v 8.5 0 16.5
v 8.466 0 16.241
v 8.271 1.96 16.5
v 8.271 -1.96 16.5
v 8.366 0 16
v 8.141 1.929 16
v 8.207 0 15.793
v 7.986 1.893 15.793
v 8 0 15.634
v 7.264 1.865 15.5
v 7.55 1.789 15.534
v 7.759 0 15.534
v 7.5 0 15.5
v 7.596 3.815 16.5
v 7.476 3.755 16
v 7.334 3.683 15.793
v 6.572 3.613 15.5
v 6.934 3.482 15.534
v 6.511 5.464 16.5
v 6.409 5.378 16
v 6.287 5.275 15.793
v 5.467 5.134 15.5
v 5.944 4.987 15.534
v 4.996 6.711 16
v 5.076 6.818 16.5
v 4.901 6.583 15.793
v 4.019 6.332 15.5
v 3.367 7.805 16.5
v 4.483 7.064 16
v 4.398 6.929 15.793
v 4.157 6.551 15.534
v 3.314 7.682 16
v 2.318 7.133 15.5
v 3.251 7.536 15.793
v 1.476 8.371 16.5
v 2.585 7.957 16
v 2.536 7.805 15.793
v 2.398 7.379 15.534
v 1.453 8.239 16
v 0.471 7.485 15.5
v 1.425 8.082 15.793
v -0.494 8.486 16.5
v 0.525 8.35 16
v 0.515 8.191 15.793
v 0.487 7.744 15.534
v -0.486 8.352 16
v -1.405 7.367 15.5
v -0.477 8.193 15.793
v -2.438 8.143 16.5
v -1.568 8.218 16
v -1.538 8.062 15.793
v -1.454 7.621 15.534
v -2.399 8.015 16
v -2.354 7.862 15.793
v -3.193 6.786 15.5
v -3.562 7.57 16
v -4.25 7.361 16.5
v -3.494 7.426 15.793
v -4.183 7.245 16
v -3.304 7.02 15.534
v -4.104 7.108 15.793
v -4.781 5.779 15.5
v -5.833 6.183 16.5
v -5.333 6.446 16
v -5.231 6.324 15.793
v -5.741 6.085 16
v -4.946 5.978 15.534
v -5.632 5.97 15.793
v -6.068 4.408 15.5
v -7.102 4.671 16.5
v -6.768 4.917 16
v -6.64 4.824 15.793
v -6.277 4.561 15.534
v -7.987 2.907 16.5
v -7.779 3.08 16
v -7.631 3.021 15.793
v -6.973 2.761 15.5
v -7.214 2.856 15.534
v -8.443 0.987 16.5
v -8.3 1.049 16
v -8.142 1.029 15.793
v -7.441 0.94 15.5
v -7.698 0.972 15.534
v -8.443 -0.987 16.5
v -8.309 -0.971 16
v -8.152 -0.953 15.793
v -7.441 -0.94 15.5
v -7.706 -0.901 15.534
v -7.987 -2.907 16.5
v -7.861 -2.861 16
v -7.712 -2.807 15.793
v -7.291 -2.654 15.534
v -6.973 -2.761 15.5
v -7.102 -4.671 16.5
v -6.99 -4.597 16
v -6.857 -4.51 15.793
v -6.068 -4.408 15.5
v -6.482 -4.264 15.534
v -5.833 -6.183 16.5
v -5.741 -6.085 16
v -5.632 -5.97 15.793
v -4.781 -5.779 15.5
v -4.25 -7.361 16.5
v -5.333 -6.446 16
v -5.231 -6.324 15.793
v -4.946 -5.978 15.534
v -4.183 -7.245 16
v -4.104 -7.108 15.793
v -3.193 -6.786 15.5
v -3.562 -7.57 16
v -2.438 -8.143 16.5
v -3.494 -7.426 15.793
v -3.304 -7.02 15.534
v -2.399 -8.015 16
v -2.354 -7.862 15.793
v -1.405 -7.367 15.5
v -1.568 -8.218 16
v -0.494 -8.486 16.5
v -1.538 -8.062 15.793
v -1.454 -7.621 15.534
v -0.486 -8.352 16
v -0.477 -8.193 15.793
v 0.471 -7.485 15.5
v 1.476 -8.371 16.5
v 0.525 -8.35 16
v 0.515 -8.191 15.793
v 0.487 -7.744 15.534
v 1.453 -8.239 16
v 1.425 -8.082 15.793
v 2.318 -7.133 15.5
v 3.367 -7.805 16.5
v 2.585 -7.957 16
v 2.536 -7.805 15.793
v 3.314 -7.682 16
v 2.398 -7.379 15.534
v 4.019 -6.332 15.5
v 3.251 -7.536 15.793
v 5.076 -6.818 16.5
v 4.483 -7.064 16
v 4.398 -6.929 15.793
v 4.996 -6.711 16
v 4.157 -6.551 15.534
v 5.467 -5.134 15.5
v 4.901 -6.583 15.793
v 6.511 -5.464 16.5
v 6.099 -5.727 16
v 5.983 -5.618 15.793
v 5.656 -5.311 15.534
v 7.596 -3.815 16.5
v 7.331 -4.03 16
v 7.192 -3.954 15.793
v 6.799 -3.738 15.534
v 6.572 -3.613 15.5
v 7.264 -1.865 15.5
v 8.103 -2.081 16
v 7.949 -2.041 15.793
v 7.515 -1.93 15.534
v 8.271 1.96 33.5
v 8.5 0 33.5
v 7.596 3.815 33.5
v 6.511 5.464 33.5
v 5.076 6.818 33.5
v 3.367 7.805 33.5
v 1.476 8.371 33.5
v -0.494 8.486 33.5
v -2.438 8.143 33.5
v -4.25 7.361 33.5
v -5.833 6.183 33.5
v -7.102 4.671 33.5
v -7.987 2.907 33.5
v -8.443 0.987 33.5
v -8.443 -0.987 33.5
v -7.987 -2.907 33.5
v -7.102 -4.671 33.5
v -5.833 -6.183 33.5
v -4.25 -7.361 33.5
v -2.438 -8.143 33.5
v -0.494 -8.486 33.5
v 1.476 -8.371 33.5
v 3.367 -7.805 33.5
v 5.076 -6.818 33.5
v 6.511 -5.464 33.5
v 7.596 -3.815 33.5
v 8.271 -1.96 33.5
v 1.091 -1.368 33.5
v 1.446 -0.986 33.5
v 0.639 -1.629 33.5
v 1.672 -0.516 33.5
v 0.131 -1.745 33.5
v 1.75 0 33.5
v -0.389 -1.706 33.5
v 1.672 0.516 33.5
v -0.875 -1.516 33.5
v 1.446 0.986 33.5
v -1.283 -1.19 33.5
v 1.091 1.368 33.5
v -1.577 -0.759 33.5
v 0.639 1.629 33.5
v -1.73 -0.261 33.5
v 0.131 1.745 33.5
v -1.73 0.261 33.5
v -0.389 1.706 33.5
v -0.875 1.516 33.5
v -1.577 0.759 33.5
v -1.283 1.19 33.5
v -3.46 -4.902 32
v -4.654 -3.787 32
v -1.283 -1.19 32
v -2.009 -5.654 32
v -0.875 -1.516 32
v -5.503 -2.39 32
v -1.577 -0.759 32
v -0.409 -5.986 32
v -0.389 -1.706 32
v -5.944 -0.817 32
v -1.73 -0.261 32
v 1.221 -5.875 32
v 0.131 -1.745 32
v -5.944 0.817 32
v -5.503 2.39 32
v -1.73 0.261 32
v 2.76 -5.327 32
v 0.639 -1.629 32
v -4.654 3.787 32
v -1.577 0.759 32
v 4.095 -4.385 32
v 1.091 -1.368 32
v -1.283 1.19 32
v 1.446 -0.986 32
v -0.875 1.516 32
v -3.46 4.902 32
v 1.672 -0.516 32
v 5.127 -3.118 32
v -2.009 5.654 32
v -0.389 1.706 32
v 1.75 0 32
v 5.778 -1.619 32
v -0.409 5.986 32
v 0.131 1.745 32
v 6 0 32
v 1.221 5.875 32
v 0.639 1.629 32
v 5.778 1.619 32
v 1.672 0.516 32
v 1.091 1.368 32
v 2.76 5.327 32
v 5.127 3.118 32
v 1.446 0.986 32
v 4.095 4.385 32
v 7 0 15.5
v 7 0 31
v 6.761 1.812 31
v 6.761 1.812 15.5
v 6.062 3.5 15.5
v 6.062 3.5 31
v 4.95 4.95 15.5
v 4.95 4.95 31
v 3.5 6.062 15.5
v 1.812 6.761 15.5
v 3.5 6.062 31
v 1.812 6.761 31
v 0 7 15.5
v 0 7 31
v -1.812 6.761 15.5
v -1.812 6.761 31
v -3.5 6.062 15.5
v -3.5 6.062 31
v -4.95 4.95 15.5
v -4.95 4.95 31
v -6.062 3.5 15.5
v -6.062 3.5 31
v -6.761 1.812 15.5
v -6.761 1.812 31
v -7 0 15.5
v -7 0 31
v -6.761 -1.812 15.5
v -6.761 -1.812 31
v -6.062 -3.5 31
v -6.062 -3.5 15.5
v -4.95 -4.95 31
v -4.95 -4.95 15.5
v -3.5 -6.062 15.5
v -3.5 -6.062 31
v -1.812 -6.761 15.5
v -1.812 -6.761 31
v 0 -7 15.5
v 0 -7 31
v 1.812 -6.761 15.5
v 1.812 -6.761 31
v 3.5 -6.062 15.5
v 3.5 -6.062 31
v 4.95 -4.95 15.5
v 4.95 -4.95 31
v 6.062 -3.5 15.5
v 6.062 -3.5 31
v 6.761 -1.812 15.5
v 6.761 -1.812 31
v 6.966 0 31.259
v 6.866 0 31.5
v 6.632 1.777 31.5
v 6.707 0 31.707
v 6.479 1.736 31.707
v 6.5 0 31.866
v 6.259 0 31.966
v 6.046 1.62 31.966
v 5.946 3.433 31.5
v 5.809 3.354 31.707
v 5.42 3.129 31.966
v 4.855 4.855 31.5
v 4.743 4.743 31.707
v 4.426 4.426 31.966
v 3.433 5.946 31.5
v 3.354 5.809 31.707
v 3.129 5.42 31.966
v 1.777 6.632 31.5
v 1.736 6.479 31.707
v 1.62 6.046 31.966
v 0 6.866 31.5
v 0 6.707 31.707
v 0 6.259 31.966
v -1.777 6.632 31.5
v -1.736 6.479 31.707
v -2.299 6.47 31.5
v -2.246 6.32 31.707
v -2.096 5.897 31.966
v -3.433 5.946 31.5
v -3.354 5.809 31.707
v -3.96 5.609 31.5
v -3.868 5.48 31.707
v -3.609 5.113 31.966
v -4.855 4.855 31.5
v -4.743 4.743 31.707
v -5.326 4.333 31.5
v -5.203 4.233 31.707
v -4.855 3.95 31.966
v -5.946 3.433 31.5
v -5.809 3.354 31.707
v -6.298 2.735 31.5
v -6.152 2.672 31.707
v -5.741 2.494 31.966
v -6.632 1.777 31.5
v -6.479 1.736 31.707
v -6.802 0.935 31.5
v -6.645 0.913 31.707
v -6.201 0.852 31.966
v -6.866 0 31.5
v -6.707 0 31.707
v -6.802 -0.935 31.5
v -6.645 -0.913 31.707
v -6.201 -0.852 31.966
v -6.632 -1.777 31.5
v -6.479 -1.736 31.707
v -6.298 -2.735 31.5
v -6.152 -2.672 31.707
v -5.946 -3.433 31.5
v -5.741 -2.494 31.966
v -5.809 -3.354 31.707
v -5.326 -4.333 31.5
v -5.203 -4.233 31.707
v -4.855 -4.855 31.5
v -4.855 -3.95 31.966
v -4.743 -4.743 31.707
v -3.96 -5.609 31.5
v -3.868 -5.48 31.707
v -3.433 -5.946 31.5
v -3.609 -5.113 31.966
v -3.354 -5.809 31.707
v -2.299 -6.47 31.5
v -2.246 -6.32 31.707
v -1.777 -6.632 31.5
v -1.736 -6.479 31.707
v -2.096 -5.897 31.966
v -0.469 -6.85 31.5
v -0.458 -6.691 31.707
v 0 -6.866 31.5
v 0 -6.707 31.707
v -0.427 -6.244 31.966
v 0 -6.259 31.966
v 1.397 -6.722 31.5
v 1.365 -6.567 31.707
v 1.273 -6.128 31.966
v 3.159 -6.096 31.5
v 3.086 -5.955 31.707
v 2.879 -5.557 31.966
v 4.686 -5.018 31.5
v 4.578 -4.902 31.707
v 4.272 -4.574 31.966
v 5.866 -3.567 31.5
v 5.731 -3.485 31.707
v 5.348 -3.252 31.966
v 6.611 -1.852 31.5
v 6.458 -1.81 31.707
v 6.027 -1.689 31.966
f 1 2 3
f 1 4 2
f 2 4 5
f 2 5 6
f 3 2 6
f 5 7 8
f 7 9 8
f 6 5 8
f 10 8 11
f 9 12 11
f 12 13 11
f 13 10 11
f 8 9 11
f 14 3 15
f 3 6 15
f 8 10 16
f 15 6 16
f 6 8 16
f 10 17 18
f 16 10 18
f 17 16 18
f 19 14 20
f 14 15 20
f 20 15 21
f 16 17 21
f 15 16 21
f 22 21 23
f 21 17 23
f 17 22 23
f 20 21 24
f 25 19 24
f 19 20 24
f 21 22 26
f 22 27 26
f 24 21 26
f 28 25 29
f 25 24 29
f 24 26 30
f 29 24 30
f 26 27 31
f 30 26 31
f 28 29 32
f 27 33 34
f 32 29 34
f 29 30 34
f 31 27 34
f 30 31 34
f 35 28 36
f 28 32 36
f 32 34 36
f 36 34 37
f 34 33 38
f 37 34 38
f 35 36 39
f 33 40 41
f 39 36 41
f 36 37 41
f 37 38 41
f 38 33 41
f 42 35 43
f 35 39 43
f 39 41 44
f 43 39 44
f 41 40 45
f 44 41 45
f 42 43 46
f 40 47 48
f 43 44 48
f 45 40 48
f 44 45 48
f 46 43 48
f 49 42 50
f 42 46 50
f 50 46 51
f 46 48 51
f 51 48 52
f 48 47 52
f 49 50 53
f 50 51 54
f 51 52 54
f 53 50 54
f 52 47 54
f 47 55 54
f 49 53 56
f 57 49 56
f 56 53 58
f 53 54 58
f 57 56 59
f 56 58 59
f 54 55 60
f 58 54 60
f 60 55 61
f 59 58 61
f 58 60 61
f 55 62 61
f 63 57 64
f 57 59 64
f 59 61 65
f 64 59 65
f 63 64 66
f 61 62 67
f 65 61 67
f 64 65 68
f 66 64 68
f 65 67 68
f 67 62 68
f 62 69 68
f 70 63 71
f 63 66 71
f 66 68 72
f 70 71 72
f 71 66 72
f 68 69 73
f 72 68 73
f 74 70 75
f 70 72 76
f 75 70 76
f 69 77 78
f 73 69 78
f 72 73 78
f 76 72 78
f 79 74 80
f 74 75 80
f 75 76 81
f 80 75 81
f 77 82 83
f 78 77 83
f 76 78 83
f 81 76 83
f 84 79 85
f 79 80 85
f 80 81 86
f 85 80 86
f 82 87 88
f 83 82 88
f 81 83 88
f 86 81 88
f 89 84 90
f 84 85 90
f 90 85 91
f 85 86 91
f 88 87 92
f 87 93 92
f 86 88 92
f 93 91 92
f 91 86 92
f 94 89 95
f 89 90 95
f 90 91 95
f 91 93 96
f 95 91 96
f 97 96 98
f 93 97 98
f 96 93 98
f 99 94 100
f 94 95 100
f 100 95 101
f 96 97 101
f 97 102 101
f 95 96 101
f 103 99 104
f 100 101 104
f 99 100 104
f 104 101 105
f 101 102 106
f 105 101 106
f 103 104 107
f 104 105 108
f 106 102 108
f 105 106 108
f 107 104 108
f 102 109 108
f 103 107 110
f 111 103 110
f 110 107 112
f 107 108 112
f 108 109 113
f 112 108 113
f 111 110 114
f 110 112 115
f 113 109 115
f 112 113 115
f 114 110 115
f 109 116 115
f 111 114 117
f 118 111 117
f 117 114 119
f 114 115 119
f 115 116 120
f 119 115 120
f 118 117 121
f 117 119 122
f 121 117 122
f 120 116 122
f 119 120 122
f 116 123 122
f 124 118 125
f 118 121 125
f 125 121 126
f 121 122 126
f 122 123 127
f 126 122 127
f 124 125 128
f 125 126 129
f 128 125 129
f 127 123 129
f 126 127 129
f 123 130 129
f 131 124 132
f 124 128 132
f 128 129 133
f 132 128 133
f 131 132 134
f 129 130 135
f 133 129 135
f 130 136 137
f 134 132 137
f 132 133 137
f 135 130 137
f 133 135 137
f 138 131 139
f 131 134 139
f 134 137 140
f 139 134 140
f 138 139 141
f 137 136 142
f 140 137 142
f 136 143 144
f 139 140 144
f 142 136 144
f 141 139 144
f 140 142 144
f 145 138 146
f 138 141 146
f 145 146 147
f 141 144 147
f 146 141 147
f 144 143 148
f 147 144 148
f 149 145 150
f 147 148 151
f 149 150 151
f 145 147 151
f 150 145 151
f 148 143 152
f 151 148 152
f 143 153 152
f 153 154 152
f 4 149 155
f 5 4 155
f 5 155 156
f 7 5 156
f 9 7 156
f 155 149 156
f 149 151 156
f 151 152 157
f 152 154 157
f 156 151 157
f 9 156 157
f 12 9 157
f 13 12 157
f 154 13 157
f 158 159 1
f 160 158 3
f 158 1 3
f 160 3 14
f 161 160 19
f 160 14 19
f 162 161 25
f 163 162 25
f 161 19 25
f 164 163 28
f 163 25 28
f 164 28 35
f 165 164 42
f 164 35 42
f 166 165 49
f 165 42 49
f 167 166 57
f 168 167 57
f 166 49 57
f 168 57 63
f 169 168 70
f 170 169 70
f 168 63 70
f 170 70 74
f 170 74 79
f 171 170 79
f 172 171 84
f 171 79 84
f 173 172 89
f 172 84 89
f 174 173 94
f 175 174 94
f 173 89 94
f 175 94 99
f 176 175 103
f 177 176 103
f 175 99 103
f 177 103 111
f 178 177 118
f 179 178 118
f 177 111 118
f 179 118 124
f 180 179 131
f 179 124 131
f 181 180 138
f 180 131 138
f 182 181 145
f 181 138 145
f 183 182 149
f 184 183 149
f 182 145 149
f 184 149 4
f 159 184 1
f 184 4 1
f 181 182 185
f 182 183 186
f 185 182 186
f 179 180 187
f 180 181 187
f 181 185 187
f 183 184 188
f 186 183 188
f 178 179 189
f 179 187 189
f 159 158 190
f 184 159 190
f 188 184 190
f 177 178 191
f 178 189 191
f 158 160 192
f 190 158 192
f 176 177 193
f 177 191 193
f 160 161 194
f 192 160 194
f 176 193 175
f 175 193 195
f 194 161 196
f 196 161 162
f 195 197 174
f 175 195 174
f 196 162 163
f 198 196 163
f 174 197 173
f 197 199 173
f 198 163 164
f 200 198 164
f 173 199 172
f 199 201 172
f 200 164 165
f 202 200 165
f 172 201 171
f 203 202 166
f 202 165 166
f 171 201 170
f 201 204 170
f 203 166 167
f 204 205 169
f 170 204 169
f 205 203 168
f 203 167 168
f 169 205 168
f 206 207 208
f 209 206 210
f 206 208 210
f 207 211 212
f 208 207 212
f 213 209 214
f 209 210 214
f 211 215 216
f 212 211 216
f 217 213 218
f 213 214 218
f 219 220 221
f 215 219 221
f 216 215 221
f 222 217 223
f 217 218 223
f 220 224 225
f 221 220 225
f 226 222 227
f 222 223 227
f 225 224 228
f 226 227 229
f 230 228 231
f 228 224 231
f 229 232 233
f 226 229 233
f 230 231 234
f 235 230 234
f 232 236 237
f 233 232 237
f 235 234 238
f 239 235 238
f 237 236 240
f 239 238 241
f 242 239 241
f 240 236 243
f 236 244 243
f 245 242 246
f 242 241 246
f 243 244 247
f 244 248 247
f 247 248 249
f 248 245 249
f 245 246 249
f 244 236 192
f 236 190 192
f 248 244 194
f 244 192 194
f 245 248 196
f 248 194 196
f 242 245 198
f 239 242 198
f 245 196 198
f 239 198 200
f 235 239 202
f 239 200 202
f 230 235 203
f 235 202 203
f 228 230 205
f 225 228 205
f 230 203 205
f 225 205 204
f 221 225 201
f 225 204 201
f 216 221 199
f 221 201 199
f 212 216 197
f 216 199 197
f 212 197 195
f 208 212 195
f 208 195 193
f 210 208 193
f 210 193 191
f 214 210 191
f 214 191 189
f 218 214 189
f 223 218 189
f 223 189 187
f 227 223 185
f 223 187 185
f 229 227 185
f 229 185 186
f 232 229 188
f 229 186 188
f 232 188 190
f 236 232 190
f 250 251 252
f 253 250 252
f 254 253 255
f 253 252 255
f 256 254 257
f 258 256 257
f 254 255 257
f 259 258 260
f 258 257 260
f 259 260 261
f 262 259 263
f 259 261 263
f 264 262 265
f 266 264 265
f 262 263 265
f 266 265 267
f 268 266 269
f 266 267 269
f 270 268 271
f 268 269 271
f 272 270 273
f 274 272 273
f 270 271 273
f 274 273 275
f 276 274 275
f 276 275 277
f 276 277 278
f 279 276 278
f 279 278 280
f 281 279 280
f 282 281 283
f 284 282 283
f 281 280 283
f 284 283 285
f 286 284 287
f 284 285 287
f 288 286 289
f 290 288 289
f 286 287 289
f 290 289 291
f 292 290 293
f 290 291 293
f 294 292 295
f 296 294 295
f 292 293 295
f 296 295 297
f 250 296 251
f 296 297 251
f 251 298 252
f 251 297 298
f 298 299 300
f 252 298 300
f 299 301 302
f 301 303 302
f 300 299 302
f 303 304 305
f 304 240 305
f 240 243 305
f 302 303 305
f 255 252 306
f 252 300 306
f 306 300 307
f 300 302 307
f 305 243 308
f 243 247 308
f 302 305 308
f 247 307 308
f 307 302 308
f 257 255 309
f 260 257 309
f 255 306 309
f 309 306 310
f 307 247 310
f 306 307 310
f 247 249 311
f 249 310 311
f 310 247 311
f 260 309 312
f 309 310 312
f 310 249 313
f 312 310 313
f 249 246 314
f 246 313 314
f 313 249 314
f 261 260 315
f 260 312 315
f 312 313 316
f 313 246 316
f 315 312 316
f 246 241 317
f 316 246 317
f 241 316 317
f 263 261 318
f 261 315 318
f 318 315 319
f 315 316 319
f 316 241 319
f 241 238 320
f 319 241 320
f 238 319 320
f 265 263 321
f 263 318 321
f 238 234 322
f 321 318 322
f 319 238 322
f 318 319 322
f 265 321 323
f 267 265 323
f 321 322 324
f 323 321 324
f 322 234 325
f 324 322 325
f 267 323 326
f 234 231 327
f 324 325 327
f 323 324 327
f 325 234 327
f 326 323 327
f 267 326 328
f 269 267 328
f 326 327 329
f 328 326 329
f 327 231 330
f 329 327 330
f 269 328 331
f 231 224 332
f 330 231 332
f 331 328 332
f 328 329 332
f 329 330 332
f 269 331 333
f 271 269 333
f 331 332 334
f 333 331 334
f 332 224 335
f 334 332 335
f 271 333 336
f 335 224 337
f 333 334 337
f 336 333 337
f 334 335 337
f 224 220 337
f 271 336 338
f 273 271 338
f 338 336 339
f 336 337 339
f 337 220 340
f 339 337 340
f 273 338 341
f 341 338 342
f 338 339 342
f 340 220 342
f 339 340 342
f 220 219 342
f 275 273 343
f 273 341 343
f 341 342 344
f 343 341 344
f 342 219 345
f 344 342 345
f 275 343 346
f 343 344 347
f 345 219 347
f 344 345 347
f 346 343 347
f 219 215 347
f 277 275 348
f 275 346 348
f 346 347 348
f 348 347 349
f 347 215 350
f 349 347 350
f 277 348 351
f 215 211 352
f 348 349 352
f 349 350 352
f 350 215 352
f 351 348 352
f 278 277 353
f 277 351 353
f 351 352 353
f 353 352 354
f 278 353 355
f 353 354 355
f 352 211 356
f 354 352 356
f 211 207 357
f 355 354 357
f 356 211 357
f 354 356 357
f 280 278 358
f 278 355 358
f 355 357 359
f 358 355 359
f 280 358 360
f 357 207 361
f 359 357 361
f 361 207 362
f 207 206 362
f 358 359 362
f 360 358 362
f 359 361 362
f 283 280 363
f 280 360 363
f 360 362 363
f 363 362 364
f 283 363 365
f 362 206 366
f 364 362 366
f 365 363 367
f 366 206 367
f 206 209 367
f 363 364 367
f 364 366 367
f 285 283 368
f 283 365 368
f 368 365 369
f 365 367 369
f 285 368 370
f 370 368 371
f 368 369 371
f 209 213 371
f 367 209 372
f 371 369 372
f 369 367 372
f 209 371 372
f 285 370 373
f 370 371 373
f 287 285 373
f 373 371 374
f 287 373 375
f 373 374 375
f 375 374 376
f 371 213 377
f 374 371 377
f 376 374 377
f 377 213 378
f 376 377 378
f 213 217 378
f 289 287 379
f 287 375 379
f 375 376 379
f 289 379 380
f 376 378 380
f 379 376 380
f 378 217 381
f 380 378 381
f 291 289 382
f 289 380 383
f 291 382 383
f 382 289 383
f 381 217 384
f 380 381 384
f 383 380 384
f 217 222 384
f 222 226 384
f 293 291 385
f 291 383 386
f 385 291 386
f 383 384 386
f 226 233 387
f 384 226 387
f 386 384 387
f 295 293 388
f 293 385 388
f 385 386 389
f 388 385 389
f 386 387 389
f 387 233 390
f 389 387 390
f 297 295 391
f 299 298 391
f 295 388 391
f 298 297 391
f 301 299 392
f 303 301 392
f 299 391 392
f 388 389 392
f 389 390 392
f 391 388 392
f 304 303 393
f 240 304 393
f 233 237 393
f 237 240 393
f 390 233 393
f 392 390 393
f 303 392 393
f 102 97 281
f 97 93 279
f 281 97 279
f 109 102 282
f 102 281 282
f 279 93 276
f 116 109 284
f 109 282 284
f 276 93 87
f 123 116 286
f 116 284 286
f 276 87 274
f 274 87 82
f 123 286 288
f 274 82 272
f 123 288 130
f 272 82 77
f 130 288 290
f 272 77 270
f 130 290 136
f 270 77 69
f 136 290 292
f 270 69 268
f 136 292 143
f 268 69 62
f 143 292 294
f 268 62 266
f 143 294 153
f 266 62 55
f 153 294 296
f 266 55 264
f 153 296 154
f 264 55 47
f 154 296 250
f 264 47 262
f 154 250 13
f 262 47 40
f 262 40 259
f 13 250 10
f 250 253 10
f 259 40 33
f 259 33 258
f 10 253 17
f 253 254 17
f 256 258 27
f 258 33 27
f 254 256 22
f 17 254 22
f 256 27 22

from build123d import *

# Parameters (mm, degrees)
FILLET003_R = 1
FILLET004_R = 1


with BuildPart() as part:
    # Sketch002 → Revolution001 (revolve)
    with BuildSketch(Plane.XZ):
        Polygon((1.75, 33.5), (8.5, 33.5), (8.5, 15.5), (7, 15.5), (7, 32), (1.75, 32), align=None)
    revolve(axis=Axis((0, 0, 0), (0, 0, 1)))

    # Fillet003
    fillet003_edges = [part.edges().sort_by_distance(p)[0] for p in [
        (-8.5, 0, 15.5),
    ]]
    fillet(fillet003_edges, radius=FILLET003_R)

    # Fillet004
    fillet004_edges = [part.edges().sort_by_distance(p)[0] for p in [
        (-7, 0, 32),
    ]]
    fillet(fillet004_edges, radius=FILLET004_R)


solid = part.part
